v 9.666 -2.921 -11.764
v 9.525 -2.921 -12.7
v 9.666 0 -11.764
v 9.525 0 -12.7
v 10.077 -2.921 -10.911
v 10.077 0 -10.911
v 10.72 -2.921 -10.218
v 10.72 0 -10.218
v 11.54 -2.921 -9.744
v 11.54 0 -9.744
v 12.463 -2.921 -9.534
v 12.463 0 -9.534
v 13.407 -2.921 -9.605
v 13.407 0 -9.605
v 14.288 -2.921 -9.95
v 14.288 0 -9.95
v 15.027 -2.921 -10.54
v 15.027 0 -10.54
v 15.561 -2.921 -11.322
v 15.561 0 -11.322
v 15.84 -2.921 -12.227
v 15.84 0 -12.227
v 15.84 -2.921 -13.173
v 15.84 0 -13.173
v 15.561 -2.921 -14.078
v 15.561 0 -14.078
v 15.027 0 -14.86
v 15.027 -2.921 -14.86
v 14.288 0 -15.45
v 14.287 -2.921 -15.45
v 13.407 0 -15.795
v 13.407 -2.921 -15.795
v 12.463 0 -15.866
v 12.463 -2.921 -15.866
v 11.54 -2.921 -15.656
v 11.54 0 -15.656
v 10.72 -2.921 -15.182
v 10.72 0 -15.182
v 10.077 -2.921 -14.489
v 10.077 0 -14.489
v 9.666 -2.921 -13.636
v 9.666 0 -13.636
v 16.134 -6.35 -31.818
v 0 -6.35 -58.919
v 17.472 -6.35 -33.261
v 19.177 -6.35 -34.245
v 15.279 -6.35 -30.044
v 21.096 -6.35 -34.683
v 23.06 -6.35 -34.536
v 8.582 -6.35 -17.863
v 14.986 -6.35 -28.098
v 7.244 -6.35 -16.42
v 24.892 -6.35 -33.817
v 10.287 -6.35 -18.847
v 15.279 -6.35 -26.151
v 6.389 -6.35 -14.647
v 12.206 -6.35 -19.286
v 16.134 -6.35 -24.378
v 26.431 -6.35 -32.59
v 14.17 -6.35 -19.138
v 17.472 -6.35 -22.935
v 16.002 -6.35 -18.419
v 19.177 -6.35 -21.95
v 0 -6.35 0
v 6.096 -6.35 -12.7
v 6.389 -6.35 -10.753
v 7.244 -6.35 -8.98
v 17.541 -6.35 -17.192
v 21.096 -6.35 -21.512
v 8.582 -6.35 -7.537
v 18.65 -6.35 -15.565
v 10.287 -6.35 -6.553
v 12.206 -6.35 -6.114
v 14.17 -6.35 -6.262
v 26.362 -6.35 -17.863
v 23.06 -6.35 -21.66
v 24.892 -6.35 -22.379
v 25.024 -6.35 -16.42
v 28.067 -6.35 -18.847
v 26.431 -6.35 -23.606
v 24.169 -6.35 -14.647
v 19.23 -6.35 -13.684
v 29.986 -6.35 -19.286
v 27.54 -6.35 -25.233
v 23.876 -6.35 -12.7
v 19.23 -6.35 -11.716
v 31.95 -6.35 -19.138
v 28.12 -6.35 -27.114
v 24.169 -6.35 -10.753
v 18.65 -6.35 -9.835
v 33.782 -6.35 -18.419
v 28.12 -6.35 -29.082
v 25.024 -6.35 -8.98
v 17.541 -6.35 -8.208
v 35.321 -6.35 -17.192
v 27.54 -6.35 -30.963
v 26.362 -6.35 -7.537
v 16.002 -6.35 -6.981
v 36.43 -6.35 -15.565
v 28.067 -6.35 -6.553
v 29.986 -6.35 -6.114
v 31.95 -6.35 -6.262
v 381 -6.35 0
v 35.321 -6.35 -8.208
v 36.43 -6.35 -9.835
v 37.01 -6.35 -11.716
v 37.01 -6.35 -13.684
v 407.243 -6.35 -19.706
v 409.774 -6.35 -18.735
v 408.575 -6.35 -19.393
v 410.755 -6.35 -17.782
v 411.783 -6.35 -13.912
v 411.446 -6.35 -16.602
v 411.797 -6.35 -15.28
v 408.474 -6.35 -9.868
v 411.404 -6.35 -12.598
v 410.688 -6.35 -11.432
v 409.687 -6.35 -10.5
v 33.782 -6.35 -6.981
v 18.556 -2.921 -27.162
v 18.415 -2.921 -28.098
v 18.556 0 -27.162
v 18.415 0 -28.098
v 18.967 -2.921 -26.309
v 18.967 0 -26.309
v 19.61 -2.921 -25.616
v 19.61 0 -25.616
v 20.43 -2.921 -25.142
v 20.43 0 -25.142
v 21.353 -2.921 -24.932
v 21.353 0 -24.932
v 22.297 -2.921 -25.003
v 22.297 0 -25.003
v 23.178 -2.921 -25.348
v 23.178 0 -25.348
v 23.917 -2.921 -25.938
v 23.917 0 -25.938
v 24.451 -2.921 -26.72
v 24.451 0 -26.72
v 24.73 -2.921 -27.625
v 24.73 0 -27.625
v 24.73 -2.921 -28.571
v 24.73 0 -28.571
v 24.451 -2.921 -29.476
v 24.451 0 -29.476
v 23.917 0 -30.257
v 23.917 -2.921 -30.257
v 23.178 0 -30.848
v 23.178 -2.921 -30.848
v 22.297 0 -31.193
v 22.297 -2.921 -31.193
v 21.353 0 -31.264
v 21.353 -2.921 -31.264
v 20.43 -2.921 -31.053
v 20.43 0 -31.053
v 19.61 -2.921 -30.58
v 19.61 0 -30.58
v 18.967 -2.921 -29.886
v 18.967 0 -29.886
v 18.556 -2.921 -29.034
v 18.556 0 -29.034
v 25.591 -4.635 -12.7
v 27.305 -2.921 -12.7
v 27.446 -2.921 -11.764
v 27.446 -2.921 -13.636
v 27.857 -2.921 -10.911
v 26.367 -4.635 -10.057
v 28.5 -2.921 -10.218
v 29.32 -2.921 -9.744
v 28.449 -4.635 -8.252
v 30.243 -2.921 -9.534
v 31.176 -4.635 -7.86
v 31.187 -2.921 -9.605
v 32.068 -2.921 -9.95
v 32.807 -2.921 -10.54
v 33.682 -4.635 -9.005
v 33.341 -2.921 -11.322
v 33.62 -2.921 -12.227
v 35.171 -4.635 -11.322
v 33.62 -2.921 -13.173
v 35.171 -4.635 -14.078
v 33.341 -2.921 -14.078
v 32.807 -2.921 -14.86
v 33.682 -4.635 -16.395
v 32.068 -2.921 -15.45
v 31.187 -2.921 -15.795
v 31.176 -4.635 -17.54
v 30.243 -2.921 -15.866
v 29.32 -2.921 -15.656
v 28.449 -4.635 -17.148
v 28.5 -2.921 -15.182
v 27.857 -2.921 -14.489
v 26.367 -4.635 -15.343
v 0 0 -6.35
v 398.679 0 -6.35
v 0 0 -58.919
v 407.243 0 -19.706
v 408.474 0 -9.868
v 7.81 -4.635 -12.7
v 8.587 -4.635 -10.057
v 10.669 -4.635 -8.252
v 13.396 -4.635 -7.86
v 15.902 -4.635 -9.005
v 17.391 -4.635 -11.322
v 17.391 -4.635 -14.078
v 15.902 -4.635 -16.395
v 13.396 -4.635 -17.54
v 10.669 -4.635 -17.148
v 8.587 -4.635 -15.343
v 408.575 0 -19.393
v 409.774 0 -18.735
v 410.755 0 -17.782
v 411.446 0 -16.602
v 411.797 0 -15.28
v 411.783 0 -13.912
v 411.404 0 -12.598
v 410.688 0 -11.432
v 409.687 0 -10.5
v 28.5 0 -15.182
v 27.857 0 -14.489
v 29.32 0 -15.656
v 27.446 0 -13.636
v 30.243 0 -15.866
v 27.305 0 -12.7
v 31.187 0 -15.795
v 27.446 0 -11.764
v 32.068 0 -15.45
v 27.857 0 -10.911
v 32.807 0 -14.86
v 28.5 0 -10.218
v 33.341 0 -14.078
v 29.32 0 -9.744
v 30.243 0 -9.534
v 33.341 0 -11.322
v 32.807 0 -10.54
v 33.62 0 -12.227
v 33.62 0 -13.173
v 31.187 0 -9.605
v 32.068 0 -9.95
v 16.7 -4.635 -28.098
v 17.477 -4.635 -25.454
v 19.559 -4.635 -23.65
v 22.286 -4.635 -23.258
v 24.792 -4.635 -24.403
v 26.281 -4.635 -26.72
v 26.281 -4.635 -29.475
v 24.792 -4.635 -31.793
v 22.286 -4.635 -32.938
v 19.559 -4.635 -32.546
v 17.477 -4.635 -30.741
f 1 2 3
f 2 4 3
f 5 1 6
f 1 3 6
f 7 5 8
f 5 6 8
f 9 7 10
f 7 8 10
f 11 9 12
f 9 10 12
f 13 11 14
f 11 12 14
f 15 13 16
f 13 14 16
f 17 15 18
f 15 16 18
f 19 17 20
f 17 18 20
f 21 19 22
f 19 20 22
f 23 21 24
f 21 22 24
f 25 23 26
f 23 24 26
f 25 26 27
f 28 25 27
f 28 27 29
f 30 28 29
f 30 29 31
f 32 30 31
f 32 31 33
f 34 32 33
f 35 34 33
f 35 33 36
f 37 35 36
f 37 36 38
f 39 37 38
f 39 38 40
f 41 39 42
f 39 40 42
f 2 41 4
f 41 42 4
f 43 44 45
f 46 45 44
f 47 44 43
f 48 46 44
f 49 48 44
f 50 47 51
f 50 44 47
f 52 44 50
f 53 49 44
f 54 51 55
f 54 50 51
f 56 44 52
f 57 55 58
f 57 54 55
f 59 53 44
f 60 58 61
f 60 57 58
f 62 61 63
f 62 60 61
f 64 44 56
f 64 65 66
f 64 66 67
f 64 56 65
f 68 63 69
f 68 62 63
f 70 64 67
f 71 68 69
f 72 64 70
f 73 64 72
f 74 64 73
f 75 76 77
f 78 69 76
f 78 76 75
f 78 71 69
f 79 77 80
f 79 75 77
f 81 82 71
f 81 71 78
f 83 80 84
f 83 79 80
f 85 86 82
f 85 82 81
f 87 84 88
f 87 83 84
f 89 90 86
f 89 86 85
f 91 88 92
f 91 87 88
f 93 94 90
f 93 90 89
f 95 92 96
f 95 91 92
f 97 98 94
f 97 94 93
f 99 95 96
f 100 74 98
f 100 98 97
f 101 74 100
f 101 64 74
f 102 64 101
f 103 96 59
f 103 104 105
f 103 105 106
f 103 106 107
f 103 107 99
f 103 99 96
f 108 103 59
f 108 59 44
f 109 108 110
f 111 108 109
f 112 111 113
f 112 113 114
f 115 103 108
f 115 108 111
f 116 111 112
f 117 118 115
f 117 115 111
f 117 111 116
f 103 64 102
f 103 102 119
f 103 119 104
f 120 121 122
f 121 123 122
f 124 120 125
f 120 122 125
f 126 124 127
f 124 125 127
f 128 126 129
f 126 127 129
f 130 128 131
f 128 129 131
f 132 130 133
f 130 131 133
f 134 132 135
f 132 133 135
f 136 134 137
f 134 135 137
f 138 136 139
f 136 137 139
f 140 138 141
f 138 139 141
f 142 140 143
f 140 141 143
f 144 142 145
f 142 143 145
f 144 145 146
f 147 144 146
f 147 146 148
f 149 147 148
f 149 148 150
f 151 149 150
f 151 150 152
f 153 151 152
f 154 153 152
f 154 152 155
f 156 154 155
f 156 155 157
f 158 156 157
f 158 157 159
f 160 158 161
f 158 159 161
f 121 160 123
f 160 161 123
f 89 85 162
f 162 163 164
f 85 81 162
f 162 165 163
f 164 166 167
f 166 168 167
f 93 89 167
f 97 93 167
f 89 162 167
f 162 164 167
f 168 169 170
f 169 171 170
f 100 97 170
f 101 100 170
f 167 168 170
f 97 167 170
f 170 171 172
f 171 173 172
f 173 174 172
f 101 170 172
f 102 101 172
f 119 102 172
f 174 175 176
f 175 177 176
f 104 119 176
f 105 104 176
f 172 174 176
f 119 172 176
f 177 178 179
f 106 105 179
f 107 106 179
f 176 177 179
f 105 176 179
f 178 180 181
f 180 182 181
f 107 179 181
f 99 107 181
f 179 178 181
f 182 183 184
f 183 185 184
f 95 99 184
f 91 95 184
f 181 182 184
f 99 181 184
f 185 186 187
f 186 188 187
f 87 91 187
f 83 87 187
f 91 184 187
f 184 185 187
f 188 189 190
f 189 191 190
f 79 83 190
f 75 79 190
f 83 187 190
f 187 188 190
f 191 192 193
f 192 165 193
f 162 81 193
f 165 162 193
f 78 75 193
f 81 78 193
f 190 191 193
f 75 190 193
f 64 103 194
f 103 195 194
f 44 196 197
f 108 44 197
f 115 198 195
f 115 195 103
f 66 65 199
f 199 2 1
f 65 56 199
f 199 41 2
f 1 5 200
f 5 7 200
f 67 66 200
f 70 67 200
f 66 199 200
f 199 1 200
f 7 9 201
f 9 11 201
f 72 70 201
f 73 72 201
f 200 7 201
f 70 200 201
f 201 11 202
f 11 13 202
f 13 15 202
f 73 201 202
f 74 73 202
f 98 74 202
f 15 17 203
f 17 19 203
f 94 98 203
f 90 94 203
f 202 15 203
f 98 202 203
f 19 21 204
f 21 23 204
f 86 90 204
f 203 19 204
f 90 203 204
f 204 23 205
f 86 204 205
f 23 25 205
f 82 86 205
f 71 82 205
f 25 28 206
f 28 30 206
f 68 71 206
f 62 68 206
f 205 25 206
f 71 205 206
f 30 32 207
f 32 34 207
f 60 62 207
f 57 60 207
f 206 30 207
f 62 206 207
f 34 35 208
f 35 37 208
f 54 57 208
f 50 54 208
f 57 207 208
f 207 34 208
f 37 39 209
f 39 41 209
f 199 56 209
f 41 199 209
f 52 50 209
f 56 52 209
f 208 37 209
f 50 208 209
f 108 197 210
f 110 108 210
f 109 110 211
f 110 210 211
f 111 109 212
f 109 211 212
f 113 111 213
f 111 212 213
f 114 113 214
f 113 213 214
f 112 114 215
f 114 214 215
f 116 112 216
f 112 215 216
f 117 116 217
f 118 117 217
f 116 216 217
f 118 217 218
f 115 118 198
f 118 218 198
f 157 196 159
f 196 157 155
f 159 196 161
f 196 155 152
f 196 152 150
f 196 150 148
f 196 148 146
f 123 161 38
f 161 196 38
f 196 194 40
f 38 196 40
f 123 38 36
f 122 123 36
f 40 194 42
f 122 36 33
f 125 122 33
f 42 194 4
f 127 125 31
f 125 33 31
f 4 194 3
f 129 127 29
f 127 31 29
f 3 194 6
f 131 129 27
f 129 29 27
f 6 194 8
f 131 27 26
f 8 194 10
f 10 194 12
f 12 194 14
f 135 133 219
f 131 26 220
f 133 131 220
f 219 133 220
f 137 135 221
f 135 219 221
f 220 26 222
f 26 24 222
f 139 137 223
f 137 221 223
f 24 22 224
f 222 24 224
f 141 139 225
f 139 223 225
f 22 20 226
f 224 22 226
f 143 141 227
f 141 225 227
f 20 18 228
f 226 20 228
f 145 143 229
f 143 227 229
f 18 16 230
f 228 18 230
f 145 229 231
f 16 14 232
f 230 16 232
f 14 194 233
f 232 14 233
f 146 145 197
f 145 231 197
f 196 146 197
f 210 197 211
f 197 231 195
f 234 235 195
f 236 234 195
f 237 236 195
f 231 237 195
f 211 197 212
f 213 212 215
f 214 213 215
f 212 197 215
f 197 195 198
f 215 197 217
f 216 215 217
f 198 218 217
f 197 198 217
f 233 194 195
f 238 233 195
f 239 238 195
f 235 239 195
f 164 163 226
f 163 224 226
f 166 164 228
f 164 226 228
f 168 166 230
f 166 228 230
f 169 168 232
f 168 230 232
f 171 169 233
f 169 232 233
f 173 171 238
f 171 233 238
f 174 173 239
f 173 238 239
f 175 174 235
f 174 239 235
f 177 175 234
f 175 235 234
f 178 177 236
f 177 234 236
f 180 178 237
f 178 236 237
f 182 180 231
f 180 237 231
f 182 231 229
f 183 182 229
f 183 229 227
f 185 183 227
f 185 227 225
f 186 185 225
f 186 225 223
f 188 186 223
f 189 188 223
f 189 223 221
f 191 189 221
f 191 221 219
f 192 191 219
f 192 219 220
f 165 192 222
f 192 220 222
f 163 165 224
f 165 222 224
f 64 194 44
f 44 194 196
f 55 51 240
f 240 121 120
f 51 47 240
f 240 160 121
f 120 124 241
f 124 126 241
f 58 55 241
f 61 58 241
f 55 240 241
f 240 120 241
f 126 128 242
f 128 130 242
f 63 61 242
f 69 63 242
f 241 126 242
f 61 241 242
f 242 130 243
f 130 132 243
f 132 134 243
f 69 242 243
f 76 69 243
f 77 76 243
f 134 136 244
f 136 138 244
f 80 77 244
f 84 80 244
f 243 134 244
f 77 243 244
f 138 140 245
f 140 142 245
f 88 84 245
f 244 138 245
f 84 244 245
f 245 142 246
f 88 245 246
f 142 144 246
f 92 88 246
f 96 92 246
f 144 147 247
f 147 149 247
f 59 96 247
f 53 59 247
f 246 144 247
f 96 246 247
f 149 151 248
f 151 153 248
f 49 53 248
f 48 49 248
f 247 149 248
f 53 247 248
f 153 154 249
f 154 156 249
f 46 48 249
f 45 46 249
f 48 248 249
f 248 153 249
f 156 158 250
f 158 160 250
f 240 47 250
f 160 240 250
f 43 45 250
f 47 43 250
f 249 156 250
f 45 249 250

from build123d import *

# Parameters (mm, degrees)
F1_DEPTH       = 6.35
F3_D           = 6.35
F3_CSINK_D     = 13.208
F3_CSINK_ANGLE = 90
F4_SIZE        = 6.34999


# Not quite as in the source:
# - a fillet or chamfer is up to 0.001 mm smaller than in the source, because OpenCascade refuses the exact size


with BuildPart() as f1:
    # F0 (on Front) → F1 (new body)
    with BuildSketch(Plane.XZ):
        with BuildLine():
            Line((381, 0), (0, 0))
            Line((0, 0), (0, -58.9188076556))
            Line((0, -58.9188076556), (407.243362891, -19.705731858))
            ThreePointArc((407.243362891, -19.705731858), (411.7971966033, -15.2795473621), (408.473715423, -9.868171981))
            Line((408.473715423, -9.868171981), (381, 0))
        make_face()
    extrude(amount=F1_DEPTH)

    # F3 (through all)
    with Locations(Plane.XZ.offset(6.35)):
        with Locations((12.7, -12.7), (30.48, -12.7), (21.59, -28.0979316793)):
            CounterSinkHole(F3_D / 2, F3_CSINK_D / 2, counter_sink_angle=F3_CSINK_ANGLE)

    # F4 (size 6.35 in the source; OpenCascade refuses exactly that, so slightly less here)
    f4_edges = [f1.edges().sort_by_distance(p)[0] for p in [
        (190.5, 0, 0),
    ]]
    chamfer(f4_edges, length=F4_SIZE)


solid = f1.part
